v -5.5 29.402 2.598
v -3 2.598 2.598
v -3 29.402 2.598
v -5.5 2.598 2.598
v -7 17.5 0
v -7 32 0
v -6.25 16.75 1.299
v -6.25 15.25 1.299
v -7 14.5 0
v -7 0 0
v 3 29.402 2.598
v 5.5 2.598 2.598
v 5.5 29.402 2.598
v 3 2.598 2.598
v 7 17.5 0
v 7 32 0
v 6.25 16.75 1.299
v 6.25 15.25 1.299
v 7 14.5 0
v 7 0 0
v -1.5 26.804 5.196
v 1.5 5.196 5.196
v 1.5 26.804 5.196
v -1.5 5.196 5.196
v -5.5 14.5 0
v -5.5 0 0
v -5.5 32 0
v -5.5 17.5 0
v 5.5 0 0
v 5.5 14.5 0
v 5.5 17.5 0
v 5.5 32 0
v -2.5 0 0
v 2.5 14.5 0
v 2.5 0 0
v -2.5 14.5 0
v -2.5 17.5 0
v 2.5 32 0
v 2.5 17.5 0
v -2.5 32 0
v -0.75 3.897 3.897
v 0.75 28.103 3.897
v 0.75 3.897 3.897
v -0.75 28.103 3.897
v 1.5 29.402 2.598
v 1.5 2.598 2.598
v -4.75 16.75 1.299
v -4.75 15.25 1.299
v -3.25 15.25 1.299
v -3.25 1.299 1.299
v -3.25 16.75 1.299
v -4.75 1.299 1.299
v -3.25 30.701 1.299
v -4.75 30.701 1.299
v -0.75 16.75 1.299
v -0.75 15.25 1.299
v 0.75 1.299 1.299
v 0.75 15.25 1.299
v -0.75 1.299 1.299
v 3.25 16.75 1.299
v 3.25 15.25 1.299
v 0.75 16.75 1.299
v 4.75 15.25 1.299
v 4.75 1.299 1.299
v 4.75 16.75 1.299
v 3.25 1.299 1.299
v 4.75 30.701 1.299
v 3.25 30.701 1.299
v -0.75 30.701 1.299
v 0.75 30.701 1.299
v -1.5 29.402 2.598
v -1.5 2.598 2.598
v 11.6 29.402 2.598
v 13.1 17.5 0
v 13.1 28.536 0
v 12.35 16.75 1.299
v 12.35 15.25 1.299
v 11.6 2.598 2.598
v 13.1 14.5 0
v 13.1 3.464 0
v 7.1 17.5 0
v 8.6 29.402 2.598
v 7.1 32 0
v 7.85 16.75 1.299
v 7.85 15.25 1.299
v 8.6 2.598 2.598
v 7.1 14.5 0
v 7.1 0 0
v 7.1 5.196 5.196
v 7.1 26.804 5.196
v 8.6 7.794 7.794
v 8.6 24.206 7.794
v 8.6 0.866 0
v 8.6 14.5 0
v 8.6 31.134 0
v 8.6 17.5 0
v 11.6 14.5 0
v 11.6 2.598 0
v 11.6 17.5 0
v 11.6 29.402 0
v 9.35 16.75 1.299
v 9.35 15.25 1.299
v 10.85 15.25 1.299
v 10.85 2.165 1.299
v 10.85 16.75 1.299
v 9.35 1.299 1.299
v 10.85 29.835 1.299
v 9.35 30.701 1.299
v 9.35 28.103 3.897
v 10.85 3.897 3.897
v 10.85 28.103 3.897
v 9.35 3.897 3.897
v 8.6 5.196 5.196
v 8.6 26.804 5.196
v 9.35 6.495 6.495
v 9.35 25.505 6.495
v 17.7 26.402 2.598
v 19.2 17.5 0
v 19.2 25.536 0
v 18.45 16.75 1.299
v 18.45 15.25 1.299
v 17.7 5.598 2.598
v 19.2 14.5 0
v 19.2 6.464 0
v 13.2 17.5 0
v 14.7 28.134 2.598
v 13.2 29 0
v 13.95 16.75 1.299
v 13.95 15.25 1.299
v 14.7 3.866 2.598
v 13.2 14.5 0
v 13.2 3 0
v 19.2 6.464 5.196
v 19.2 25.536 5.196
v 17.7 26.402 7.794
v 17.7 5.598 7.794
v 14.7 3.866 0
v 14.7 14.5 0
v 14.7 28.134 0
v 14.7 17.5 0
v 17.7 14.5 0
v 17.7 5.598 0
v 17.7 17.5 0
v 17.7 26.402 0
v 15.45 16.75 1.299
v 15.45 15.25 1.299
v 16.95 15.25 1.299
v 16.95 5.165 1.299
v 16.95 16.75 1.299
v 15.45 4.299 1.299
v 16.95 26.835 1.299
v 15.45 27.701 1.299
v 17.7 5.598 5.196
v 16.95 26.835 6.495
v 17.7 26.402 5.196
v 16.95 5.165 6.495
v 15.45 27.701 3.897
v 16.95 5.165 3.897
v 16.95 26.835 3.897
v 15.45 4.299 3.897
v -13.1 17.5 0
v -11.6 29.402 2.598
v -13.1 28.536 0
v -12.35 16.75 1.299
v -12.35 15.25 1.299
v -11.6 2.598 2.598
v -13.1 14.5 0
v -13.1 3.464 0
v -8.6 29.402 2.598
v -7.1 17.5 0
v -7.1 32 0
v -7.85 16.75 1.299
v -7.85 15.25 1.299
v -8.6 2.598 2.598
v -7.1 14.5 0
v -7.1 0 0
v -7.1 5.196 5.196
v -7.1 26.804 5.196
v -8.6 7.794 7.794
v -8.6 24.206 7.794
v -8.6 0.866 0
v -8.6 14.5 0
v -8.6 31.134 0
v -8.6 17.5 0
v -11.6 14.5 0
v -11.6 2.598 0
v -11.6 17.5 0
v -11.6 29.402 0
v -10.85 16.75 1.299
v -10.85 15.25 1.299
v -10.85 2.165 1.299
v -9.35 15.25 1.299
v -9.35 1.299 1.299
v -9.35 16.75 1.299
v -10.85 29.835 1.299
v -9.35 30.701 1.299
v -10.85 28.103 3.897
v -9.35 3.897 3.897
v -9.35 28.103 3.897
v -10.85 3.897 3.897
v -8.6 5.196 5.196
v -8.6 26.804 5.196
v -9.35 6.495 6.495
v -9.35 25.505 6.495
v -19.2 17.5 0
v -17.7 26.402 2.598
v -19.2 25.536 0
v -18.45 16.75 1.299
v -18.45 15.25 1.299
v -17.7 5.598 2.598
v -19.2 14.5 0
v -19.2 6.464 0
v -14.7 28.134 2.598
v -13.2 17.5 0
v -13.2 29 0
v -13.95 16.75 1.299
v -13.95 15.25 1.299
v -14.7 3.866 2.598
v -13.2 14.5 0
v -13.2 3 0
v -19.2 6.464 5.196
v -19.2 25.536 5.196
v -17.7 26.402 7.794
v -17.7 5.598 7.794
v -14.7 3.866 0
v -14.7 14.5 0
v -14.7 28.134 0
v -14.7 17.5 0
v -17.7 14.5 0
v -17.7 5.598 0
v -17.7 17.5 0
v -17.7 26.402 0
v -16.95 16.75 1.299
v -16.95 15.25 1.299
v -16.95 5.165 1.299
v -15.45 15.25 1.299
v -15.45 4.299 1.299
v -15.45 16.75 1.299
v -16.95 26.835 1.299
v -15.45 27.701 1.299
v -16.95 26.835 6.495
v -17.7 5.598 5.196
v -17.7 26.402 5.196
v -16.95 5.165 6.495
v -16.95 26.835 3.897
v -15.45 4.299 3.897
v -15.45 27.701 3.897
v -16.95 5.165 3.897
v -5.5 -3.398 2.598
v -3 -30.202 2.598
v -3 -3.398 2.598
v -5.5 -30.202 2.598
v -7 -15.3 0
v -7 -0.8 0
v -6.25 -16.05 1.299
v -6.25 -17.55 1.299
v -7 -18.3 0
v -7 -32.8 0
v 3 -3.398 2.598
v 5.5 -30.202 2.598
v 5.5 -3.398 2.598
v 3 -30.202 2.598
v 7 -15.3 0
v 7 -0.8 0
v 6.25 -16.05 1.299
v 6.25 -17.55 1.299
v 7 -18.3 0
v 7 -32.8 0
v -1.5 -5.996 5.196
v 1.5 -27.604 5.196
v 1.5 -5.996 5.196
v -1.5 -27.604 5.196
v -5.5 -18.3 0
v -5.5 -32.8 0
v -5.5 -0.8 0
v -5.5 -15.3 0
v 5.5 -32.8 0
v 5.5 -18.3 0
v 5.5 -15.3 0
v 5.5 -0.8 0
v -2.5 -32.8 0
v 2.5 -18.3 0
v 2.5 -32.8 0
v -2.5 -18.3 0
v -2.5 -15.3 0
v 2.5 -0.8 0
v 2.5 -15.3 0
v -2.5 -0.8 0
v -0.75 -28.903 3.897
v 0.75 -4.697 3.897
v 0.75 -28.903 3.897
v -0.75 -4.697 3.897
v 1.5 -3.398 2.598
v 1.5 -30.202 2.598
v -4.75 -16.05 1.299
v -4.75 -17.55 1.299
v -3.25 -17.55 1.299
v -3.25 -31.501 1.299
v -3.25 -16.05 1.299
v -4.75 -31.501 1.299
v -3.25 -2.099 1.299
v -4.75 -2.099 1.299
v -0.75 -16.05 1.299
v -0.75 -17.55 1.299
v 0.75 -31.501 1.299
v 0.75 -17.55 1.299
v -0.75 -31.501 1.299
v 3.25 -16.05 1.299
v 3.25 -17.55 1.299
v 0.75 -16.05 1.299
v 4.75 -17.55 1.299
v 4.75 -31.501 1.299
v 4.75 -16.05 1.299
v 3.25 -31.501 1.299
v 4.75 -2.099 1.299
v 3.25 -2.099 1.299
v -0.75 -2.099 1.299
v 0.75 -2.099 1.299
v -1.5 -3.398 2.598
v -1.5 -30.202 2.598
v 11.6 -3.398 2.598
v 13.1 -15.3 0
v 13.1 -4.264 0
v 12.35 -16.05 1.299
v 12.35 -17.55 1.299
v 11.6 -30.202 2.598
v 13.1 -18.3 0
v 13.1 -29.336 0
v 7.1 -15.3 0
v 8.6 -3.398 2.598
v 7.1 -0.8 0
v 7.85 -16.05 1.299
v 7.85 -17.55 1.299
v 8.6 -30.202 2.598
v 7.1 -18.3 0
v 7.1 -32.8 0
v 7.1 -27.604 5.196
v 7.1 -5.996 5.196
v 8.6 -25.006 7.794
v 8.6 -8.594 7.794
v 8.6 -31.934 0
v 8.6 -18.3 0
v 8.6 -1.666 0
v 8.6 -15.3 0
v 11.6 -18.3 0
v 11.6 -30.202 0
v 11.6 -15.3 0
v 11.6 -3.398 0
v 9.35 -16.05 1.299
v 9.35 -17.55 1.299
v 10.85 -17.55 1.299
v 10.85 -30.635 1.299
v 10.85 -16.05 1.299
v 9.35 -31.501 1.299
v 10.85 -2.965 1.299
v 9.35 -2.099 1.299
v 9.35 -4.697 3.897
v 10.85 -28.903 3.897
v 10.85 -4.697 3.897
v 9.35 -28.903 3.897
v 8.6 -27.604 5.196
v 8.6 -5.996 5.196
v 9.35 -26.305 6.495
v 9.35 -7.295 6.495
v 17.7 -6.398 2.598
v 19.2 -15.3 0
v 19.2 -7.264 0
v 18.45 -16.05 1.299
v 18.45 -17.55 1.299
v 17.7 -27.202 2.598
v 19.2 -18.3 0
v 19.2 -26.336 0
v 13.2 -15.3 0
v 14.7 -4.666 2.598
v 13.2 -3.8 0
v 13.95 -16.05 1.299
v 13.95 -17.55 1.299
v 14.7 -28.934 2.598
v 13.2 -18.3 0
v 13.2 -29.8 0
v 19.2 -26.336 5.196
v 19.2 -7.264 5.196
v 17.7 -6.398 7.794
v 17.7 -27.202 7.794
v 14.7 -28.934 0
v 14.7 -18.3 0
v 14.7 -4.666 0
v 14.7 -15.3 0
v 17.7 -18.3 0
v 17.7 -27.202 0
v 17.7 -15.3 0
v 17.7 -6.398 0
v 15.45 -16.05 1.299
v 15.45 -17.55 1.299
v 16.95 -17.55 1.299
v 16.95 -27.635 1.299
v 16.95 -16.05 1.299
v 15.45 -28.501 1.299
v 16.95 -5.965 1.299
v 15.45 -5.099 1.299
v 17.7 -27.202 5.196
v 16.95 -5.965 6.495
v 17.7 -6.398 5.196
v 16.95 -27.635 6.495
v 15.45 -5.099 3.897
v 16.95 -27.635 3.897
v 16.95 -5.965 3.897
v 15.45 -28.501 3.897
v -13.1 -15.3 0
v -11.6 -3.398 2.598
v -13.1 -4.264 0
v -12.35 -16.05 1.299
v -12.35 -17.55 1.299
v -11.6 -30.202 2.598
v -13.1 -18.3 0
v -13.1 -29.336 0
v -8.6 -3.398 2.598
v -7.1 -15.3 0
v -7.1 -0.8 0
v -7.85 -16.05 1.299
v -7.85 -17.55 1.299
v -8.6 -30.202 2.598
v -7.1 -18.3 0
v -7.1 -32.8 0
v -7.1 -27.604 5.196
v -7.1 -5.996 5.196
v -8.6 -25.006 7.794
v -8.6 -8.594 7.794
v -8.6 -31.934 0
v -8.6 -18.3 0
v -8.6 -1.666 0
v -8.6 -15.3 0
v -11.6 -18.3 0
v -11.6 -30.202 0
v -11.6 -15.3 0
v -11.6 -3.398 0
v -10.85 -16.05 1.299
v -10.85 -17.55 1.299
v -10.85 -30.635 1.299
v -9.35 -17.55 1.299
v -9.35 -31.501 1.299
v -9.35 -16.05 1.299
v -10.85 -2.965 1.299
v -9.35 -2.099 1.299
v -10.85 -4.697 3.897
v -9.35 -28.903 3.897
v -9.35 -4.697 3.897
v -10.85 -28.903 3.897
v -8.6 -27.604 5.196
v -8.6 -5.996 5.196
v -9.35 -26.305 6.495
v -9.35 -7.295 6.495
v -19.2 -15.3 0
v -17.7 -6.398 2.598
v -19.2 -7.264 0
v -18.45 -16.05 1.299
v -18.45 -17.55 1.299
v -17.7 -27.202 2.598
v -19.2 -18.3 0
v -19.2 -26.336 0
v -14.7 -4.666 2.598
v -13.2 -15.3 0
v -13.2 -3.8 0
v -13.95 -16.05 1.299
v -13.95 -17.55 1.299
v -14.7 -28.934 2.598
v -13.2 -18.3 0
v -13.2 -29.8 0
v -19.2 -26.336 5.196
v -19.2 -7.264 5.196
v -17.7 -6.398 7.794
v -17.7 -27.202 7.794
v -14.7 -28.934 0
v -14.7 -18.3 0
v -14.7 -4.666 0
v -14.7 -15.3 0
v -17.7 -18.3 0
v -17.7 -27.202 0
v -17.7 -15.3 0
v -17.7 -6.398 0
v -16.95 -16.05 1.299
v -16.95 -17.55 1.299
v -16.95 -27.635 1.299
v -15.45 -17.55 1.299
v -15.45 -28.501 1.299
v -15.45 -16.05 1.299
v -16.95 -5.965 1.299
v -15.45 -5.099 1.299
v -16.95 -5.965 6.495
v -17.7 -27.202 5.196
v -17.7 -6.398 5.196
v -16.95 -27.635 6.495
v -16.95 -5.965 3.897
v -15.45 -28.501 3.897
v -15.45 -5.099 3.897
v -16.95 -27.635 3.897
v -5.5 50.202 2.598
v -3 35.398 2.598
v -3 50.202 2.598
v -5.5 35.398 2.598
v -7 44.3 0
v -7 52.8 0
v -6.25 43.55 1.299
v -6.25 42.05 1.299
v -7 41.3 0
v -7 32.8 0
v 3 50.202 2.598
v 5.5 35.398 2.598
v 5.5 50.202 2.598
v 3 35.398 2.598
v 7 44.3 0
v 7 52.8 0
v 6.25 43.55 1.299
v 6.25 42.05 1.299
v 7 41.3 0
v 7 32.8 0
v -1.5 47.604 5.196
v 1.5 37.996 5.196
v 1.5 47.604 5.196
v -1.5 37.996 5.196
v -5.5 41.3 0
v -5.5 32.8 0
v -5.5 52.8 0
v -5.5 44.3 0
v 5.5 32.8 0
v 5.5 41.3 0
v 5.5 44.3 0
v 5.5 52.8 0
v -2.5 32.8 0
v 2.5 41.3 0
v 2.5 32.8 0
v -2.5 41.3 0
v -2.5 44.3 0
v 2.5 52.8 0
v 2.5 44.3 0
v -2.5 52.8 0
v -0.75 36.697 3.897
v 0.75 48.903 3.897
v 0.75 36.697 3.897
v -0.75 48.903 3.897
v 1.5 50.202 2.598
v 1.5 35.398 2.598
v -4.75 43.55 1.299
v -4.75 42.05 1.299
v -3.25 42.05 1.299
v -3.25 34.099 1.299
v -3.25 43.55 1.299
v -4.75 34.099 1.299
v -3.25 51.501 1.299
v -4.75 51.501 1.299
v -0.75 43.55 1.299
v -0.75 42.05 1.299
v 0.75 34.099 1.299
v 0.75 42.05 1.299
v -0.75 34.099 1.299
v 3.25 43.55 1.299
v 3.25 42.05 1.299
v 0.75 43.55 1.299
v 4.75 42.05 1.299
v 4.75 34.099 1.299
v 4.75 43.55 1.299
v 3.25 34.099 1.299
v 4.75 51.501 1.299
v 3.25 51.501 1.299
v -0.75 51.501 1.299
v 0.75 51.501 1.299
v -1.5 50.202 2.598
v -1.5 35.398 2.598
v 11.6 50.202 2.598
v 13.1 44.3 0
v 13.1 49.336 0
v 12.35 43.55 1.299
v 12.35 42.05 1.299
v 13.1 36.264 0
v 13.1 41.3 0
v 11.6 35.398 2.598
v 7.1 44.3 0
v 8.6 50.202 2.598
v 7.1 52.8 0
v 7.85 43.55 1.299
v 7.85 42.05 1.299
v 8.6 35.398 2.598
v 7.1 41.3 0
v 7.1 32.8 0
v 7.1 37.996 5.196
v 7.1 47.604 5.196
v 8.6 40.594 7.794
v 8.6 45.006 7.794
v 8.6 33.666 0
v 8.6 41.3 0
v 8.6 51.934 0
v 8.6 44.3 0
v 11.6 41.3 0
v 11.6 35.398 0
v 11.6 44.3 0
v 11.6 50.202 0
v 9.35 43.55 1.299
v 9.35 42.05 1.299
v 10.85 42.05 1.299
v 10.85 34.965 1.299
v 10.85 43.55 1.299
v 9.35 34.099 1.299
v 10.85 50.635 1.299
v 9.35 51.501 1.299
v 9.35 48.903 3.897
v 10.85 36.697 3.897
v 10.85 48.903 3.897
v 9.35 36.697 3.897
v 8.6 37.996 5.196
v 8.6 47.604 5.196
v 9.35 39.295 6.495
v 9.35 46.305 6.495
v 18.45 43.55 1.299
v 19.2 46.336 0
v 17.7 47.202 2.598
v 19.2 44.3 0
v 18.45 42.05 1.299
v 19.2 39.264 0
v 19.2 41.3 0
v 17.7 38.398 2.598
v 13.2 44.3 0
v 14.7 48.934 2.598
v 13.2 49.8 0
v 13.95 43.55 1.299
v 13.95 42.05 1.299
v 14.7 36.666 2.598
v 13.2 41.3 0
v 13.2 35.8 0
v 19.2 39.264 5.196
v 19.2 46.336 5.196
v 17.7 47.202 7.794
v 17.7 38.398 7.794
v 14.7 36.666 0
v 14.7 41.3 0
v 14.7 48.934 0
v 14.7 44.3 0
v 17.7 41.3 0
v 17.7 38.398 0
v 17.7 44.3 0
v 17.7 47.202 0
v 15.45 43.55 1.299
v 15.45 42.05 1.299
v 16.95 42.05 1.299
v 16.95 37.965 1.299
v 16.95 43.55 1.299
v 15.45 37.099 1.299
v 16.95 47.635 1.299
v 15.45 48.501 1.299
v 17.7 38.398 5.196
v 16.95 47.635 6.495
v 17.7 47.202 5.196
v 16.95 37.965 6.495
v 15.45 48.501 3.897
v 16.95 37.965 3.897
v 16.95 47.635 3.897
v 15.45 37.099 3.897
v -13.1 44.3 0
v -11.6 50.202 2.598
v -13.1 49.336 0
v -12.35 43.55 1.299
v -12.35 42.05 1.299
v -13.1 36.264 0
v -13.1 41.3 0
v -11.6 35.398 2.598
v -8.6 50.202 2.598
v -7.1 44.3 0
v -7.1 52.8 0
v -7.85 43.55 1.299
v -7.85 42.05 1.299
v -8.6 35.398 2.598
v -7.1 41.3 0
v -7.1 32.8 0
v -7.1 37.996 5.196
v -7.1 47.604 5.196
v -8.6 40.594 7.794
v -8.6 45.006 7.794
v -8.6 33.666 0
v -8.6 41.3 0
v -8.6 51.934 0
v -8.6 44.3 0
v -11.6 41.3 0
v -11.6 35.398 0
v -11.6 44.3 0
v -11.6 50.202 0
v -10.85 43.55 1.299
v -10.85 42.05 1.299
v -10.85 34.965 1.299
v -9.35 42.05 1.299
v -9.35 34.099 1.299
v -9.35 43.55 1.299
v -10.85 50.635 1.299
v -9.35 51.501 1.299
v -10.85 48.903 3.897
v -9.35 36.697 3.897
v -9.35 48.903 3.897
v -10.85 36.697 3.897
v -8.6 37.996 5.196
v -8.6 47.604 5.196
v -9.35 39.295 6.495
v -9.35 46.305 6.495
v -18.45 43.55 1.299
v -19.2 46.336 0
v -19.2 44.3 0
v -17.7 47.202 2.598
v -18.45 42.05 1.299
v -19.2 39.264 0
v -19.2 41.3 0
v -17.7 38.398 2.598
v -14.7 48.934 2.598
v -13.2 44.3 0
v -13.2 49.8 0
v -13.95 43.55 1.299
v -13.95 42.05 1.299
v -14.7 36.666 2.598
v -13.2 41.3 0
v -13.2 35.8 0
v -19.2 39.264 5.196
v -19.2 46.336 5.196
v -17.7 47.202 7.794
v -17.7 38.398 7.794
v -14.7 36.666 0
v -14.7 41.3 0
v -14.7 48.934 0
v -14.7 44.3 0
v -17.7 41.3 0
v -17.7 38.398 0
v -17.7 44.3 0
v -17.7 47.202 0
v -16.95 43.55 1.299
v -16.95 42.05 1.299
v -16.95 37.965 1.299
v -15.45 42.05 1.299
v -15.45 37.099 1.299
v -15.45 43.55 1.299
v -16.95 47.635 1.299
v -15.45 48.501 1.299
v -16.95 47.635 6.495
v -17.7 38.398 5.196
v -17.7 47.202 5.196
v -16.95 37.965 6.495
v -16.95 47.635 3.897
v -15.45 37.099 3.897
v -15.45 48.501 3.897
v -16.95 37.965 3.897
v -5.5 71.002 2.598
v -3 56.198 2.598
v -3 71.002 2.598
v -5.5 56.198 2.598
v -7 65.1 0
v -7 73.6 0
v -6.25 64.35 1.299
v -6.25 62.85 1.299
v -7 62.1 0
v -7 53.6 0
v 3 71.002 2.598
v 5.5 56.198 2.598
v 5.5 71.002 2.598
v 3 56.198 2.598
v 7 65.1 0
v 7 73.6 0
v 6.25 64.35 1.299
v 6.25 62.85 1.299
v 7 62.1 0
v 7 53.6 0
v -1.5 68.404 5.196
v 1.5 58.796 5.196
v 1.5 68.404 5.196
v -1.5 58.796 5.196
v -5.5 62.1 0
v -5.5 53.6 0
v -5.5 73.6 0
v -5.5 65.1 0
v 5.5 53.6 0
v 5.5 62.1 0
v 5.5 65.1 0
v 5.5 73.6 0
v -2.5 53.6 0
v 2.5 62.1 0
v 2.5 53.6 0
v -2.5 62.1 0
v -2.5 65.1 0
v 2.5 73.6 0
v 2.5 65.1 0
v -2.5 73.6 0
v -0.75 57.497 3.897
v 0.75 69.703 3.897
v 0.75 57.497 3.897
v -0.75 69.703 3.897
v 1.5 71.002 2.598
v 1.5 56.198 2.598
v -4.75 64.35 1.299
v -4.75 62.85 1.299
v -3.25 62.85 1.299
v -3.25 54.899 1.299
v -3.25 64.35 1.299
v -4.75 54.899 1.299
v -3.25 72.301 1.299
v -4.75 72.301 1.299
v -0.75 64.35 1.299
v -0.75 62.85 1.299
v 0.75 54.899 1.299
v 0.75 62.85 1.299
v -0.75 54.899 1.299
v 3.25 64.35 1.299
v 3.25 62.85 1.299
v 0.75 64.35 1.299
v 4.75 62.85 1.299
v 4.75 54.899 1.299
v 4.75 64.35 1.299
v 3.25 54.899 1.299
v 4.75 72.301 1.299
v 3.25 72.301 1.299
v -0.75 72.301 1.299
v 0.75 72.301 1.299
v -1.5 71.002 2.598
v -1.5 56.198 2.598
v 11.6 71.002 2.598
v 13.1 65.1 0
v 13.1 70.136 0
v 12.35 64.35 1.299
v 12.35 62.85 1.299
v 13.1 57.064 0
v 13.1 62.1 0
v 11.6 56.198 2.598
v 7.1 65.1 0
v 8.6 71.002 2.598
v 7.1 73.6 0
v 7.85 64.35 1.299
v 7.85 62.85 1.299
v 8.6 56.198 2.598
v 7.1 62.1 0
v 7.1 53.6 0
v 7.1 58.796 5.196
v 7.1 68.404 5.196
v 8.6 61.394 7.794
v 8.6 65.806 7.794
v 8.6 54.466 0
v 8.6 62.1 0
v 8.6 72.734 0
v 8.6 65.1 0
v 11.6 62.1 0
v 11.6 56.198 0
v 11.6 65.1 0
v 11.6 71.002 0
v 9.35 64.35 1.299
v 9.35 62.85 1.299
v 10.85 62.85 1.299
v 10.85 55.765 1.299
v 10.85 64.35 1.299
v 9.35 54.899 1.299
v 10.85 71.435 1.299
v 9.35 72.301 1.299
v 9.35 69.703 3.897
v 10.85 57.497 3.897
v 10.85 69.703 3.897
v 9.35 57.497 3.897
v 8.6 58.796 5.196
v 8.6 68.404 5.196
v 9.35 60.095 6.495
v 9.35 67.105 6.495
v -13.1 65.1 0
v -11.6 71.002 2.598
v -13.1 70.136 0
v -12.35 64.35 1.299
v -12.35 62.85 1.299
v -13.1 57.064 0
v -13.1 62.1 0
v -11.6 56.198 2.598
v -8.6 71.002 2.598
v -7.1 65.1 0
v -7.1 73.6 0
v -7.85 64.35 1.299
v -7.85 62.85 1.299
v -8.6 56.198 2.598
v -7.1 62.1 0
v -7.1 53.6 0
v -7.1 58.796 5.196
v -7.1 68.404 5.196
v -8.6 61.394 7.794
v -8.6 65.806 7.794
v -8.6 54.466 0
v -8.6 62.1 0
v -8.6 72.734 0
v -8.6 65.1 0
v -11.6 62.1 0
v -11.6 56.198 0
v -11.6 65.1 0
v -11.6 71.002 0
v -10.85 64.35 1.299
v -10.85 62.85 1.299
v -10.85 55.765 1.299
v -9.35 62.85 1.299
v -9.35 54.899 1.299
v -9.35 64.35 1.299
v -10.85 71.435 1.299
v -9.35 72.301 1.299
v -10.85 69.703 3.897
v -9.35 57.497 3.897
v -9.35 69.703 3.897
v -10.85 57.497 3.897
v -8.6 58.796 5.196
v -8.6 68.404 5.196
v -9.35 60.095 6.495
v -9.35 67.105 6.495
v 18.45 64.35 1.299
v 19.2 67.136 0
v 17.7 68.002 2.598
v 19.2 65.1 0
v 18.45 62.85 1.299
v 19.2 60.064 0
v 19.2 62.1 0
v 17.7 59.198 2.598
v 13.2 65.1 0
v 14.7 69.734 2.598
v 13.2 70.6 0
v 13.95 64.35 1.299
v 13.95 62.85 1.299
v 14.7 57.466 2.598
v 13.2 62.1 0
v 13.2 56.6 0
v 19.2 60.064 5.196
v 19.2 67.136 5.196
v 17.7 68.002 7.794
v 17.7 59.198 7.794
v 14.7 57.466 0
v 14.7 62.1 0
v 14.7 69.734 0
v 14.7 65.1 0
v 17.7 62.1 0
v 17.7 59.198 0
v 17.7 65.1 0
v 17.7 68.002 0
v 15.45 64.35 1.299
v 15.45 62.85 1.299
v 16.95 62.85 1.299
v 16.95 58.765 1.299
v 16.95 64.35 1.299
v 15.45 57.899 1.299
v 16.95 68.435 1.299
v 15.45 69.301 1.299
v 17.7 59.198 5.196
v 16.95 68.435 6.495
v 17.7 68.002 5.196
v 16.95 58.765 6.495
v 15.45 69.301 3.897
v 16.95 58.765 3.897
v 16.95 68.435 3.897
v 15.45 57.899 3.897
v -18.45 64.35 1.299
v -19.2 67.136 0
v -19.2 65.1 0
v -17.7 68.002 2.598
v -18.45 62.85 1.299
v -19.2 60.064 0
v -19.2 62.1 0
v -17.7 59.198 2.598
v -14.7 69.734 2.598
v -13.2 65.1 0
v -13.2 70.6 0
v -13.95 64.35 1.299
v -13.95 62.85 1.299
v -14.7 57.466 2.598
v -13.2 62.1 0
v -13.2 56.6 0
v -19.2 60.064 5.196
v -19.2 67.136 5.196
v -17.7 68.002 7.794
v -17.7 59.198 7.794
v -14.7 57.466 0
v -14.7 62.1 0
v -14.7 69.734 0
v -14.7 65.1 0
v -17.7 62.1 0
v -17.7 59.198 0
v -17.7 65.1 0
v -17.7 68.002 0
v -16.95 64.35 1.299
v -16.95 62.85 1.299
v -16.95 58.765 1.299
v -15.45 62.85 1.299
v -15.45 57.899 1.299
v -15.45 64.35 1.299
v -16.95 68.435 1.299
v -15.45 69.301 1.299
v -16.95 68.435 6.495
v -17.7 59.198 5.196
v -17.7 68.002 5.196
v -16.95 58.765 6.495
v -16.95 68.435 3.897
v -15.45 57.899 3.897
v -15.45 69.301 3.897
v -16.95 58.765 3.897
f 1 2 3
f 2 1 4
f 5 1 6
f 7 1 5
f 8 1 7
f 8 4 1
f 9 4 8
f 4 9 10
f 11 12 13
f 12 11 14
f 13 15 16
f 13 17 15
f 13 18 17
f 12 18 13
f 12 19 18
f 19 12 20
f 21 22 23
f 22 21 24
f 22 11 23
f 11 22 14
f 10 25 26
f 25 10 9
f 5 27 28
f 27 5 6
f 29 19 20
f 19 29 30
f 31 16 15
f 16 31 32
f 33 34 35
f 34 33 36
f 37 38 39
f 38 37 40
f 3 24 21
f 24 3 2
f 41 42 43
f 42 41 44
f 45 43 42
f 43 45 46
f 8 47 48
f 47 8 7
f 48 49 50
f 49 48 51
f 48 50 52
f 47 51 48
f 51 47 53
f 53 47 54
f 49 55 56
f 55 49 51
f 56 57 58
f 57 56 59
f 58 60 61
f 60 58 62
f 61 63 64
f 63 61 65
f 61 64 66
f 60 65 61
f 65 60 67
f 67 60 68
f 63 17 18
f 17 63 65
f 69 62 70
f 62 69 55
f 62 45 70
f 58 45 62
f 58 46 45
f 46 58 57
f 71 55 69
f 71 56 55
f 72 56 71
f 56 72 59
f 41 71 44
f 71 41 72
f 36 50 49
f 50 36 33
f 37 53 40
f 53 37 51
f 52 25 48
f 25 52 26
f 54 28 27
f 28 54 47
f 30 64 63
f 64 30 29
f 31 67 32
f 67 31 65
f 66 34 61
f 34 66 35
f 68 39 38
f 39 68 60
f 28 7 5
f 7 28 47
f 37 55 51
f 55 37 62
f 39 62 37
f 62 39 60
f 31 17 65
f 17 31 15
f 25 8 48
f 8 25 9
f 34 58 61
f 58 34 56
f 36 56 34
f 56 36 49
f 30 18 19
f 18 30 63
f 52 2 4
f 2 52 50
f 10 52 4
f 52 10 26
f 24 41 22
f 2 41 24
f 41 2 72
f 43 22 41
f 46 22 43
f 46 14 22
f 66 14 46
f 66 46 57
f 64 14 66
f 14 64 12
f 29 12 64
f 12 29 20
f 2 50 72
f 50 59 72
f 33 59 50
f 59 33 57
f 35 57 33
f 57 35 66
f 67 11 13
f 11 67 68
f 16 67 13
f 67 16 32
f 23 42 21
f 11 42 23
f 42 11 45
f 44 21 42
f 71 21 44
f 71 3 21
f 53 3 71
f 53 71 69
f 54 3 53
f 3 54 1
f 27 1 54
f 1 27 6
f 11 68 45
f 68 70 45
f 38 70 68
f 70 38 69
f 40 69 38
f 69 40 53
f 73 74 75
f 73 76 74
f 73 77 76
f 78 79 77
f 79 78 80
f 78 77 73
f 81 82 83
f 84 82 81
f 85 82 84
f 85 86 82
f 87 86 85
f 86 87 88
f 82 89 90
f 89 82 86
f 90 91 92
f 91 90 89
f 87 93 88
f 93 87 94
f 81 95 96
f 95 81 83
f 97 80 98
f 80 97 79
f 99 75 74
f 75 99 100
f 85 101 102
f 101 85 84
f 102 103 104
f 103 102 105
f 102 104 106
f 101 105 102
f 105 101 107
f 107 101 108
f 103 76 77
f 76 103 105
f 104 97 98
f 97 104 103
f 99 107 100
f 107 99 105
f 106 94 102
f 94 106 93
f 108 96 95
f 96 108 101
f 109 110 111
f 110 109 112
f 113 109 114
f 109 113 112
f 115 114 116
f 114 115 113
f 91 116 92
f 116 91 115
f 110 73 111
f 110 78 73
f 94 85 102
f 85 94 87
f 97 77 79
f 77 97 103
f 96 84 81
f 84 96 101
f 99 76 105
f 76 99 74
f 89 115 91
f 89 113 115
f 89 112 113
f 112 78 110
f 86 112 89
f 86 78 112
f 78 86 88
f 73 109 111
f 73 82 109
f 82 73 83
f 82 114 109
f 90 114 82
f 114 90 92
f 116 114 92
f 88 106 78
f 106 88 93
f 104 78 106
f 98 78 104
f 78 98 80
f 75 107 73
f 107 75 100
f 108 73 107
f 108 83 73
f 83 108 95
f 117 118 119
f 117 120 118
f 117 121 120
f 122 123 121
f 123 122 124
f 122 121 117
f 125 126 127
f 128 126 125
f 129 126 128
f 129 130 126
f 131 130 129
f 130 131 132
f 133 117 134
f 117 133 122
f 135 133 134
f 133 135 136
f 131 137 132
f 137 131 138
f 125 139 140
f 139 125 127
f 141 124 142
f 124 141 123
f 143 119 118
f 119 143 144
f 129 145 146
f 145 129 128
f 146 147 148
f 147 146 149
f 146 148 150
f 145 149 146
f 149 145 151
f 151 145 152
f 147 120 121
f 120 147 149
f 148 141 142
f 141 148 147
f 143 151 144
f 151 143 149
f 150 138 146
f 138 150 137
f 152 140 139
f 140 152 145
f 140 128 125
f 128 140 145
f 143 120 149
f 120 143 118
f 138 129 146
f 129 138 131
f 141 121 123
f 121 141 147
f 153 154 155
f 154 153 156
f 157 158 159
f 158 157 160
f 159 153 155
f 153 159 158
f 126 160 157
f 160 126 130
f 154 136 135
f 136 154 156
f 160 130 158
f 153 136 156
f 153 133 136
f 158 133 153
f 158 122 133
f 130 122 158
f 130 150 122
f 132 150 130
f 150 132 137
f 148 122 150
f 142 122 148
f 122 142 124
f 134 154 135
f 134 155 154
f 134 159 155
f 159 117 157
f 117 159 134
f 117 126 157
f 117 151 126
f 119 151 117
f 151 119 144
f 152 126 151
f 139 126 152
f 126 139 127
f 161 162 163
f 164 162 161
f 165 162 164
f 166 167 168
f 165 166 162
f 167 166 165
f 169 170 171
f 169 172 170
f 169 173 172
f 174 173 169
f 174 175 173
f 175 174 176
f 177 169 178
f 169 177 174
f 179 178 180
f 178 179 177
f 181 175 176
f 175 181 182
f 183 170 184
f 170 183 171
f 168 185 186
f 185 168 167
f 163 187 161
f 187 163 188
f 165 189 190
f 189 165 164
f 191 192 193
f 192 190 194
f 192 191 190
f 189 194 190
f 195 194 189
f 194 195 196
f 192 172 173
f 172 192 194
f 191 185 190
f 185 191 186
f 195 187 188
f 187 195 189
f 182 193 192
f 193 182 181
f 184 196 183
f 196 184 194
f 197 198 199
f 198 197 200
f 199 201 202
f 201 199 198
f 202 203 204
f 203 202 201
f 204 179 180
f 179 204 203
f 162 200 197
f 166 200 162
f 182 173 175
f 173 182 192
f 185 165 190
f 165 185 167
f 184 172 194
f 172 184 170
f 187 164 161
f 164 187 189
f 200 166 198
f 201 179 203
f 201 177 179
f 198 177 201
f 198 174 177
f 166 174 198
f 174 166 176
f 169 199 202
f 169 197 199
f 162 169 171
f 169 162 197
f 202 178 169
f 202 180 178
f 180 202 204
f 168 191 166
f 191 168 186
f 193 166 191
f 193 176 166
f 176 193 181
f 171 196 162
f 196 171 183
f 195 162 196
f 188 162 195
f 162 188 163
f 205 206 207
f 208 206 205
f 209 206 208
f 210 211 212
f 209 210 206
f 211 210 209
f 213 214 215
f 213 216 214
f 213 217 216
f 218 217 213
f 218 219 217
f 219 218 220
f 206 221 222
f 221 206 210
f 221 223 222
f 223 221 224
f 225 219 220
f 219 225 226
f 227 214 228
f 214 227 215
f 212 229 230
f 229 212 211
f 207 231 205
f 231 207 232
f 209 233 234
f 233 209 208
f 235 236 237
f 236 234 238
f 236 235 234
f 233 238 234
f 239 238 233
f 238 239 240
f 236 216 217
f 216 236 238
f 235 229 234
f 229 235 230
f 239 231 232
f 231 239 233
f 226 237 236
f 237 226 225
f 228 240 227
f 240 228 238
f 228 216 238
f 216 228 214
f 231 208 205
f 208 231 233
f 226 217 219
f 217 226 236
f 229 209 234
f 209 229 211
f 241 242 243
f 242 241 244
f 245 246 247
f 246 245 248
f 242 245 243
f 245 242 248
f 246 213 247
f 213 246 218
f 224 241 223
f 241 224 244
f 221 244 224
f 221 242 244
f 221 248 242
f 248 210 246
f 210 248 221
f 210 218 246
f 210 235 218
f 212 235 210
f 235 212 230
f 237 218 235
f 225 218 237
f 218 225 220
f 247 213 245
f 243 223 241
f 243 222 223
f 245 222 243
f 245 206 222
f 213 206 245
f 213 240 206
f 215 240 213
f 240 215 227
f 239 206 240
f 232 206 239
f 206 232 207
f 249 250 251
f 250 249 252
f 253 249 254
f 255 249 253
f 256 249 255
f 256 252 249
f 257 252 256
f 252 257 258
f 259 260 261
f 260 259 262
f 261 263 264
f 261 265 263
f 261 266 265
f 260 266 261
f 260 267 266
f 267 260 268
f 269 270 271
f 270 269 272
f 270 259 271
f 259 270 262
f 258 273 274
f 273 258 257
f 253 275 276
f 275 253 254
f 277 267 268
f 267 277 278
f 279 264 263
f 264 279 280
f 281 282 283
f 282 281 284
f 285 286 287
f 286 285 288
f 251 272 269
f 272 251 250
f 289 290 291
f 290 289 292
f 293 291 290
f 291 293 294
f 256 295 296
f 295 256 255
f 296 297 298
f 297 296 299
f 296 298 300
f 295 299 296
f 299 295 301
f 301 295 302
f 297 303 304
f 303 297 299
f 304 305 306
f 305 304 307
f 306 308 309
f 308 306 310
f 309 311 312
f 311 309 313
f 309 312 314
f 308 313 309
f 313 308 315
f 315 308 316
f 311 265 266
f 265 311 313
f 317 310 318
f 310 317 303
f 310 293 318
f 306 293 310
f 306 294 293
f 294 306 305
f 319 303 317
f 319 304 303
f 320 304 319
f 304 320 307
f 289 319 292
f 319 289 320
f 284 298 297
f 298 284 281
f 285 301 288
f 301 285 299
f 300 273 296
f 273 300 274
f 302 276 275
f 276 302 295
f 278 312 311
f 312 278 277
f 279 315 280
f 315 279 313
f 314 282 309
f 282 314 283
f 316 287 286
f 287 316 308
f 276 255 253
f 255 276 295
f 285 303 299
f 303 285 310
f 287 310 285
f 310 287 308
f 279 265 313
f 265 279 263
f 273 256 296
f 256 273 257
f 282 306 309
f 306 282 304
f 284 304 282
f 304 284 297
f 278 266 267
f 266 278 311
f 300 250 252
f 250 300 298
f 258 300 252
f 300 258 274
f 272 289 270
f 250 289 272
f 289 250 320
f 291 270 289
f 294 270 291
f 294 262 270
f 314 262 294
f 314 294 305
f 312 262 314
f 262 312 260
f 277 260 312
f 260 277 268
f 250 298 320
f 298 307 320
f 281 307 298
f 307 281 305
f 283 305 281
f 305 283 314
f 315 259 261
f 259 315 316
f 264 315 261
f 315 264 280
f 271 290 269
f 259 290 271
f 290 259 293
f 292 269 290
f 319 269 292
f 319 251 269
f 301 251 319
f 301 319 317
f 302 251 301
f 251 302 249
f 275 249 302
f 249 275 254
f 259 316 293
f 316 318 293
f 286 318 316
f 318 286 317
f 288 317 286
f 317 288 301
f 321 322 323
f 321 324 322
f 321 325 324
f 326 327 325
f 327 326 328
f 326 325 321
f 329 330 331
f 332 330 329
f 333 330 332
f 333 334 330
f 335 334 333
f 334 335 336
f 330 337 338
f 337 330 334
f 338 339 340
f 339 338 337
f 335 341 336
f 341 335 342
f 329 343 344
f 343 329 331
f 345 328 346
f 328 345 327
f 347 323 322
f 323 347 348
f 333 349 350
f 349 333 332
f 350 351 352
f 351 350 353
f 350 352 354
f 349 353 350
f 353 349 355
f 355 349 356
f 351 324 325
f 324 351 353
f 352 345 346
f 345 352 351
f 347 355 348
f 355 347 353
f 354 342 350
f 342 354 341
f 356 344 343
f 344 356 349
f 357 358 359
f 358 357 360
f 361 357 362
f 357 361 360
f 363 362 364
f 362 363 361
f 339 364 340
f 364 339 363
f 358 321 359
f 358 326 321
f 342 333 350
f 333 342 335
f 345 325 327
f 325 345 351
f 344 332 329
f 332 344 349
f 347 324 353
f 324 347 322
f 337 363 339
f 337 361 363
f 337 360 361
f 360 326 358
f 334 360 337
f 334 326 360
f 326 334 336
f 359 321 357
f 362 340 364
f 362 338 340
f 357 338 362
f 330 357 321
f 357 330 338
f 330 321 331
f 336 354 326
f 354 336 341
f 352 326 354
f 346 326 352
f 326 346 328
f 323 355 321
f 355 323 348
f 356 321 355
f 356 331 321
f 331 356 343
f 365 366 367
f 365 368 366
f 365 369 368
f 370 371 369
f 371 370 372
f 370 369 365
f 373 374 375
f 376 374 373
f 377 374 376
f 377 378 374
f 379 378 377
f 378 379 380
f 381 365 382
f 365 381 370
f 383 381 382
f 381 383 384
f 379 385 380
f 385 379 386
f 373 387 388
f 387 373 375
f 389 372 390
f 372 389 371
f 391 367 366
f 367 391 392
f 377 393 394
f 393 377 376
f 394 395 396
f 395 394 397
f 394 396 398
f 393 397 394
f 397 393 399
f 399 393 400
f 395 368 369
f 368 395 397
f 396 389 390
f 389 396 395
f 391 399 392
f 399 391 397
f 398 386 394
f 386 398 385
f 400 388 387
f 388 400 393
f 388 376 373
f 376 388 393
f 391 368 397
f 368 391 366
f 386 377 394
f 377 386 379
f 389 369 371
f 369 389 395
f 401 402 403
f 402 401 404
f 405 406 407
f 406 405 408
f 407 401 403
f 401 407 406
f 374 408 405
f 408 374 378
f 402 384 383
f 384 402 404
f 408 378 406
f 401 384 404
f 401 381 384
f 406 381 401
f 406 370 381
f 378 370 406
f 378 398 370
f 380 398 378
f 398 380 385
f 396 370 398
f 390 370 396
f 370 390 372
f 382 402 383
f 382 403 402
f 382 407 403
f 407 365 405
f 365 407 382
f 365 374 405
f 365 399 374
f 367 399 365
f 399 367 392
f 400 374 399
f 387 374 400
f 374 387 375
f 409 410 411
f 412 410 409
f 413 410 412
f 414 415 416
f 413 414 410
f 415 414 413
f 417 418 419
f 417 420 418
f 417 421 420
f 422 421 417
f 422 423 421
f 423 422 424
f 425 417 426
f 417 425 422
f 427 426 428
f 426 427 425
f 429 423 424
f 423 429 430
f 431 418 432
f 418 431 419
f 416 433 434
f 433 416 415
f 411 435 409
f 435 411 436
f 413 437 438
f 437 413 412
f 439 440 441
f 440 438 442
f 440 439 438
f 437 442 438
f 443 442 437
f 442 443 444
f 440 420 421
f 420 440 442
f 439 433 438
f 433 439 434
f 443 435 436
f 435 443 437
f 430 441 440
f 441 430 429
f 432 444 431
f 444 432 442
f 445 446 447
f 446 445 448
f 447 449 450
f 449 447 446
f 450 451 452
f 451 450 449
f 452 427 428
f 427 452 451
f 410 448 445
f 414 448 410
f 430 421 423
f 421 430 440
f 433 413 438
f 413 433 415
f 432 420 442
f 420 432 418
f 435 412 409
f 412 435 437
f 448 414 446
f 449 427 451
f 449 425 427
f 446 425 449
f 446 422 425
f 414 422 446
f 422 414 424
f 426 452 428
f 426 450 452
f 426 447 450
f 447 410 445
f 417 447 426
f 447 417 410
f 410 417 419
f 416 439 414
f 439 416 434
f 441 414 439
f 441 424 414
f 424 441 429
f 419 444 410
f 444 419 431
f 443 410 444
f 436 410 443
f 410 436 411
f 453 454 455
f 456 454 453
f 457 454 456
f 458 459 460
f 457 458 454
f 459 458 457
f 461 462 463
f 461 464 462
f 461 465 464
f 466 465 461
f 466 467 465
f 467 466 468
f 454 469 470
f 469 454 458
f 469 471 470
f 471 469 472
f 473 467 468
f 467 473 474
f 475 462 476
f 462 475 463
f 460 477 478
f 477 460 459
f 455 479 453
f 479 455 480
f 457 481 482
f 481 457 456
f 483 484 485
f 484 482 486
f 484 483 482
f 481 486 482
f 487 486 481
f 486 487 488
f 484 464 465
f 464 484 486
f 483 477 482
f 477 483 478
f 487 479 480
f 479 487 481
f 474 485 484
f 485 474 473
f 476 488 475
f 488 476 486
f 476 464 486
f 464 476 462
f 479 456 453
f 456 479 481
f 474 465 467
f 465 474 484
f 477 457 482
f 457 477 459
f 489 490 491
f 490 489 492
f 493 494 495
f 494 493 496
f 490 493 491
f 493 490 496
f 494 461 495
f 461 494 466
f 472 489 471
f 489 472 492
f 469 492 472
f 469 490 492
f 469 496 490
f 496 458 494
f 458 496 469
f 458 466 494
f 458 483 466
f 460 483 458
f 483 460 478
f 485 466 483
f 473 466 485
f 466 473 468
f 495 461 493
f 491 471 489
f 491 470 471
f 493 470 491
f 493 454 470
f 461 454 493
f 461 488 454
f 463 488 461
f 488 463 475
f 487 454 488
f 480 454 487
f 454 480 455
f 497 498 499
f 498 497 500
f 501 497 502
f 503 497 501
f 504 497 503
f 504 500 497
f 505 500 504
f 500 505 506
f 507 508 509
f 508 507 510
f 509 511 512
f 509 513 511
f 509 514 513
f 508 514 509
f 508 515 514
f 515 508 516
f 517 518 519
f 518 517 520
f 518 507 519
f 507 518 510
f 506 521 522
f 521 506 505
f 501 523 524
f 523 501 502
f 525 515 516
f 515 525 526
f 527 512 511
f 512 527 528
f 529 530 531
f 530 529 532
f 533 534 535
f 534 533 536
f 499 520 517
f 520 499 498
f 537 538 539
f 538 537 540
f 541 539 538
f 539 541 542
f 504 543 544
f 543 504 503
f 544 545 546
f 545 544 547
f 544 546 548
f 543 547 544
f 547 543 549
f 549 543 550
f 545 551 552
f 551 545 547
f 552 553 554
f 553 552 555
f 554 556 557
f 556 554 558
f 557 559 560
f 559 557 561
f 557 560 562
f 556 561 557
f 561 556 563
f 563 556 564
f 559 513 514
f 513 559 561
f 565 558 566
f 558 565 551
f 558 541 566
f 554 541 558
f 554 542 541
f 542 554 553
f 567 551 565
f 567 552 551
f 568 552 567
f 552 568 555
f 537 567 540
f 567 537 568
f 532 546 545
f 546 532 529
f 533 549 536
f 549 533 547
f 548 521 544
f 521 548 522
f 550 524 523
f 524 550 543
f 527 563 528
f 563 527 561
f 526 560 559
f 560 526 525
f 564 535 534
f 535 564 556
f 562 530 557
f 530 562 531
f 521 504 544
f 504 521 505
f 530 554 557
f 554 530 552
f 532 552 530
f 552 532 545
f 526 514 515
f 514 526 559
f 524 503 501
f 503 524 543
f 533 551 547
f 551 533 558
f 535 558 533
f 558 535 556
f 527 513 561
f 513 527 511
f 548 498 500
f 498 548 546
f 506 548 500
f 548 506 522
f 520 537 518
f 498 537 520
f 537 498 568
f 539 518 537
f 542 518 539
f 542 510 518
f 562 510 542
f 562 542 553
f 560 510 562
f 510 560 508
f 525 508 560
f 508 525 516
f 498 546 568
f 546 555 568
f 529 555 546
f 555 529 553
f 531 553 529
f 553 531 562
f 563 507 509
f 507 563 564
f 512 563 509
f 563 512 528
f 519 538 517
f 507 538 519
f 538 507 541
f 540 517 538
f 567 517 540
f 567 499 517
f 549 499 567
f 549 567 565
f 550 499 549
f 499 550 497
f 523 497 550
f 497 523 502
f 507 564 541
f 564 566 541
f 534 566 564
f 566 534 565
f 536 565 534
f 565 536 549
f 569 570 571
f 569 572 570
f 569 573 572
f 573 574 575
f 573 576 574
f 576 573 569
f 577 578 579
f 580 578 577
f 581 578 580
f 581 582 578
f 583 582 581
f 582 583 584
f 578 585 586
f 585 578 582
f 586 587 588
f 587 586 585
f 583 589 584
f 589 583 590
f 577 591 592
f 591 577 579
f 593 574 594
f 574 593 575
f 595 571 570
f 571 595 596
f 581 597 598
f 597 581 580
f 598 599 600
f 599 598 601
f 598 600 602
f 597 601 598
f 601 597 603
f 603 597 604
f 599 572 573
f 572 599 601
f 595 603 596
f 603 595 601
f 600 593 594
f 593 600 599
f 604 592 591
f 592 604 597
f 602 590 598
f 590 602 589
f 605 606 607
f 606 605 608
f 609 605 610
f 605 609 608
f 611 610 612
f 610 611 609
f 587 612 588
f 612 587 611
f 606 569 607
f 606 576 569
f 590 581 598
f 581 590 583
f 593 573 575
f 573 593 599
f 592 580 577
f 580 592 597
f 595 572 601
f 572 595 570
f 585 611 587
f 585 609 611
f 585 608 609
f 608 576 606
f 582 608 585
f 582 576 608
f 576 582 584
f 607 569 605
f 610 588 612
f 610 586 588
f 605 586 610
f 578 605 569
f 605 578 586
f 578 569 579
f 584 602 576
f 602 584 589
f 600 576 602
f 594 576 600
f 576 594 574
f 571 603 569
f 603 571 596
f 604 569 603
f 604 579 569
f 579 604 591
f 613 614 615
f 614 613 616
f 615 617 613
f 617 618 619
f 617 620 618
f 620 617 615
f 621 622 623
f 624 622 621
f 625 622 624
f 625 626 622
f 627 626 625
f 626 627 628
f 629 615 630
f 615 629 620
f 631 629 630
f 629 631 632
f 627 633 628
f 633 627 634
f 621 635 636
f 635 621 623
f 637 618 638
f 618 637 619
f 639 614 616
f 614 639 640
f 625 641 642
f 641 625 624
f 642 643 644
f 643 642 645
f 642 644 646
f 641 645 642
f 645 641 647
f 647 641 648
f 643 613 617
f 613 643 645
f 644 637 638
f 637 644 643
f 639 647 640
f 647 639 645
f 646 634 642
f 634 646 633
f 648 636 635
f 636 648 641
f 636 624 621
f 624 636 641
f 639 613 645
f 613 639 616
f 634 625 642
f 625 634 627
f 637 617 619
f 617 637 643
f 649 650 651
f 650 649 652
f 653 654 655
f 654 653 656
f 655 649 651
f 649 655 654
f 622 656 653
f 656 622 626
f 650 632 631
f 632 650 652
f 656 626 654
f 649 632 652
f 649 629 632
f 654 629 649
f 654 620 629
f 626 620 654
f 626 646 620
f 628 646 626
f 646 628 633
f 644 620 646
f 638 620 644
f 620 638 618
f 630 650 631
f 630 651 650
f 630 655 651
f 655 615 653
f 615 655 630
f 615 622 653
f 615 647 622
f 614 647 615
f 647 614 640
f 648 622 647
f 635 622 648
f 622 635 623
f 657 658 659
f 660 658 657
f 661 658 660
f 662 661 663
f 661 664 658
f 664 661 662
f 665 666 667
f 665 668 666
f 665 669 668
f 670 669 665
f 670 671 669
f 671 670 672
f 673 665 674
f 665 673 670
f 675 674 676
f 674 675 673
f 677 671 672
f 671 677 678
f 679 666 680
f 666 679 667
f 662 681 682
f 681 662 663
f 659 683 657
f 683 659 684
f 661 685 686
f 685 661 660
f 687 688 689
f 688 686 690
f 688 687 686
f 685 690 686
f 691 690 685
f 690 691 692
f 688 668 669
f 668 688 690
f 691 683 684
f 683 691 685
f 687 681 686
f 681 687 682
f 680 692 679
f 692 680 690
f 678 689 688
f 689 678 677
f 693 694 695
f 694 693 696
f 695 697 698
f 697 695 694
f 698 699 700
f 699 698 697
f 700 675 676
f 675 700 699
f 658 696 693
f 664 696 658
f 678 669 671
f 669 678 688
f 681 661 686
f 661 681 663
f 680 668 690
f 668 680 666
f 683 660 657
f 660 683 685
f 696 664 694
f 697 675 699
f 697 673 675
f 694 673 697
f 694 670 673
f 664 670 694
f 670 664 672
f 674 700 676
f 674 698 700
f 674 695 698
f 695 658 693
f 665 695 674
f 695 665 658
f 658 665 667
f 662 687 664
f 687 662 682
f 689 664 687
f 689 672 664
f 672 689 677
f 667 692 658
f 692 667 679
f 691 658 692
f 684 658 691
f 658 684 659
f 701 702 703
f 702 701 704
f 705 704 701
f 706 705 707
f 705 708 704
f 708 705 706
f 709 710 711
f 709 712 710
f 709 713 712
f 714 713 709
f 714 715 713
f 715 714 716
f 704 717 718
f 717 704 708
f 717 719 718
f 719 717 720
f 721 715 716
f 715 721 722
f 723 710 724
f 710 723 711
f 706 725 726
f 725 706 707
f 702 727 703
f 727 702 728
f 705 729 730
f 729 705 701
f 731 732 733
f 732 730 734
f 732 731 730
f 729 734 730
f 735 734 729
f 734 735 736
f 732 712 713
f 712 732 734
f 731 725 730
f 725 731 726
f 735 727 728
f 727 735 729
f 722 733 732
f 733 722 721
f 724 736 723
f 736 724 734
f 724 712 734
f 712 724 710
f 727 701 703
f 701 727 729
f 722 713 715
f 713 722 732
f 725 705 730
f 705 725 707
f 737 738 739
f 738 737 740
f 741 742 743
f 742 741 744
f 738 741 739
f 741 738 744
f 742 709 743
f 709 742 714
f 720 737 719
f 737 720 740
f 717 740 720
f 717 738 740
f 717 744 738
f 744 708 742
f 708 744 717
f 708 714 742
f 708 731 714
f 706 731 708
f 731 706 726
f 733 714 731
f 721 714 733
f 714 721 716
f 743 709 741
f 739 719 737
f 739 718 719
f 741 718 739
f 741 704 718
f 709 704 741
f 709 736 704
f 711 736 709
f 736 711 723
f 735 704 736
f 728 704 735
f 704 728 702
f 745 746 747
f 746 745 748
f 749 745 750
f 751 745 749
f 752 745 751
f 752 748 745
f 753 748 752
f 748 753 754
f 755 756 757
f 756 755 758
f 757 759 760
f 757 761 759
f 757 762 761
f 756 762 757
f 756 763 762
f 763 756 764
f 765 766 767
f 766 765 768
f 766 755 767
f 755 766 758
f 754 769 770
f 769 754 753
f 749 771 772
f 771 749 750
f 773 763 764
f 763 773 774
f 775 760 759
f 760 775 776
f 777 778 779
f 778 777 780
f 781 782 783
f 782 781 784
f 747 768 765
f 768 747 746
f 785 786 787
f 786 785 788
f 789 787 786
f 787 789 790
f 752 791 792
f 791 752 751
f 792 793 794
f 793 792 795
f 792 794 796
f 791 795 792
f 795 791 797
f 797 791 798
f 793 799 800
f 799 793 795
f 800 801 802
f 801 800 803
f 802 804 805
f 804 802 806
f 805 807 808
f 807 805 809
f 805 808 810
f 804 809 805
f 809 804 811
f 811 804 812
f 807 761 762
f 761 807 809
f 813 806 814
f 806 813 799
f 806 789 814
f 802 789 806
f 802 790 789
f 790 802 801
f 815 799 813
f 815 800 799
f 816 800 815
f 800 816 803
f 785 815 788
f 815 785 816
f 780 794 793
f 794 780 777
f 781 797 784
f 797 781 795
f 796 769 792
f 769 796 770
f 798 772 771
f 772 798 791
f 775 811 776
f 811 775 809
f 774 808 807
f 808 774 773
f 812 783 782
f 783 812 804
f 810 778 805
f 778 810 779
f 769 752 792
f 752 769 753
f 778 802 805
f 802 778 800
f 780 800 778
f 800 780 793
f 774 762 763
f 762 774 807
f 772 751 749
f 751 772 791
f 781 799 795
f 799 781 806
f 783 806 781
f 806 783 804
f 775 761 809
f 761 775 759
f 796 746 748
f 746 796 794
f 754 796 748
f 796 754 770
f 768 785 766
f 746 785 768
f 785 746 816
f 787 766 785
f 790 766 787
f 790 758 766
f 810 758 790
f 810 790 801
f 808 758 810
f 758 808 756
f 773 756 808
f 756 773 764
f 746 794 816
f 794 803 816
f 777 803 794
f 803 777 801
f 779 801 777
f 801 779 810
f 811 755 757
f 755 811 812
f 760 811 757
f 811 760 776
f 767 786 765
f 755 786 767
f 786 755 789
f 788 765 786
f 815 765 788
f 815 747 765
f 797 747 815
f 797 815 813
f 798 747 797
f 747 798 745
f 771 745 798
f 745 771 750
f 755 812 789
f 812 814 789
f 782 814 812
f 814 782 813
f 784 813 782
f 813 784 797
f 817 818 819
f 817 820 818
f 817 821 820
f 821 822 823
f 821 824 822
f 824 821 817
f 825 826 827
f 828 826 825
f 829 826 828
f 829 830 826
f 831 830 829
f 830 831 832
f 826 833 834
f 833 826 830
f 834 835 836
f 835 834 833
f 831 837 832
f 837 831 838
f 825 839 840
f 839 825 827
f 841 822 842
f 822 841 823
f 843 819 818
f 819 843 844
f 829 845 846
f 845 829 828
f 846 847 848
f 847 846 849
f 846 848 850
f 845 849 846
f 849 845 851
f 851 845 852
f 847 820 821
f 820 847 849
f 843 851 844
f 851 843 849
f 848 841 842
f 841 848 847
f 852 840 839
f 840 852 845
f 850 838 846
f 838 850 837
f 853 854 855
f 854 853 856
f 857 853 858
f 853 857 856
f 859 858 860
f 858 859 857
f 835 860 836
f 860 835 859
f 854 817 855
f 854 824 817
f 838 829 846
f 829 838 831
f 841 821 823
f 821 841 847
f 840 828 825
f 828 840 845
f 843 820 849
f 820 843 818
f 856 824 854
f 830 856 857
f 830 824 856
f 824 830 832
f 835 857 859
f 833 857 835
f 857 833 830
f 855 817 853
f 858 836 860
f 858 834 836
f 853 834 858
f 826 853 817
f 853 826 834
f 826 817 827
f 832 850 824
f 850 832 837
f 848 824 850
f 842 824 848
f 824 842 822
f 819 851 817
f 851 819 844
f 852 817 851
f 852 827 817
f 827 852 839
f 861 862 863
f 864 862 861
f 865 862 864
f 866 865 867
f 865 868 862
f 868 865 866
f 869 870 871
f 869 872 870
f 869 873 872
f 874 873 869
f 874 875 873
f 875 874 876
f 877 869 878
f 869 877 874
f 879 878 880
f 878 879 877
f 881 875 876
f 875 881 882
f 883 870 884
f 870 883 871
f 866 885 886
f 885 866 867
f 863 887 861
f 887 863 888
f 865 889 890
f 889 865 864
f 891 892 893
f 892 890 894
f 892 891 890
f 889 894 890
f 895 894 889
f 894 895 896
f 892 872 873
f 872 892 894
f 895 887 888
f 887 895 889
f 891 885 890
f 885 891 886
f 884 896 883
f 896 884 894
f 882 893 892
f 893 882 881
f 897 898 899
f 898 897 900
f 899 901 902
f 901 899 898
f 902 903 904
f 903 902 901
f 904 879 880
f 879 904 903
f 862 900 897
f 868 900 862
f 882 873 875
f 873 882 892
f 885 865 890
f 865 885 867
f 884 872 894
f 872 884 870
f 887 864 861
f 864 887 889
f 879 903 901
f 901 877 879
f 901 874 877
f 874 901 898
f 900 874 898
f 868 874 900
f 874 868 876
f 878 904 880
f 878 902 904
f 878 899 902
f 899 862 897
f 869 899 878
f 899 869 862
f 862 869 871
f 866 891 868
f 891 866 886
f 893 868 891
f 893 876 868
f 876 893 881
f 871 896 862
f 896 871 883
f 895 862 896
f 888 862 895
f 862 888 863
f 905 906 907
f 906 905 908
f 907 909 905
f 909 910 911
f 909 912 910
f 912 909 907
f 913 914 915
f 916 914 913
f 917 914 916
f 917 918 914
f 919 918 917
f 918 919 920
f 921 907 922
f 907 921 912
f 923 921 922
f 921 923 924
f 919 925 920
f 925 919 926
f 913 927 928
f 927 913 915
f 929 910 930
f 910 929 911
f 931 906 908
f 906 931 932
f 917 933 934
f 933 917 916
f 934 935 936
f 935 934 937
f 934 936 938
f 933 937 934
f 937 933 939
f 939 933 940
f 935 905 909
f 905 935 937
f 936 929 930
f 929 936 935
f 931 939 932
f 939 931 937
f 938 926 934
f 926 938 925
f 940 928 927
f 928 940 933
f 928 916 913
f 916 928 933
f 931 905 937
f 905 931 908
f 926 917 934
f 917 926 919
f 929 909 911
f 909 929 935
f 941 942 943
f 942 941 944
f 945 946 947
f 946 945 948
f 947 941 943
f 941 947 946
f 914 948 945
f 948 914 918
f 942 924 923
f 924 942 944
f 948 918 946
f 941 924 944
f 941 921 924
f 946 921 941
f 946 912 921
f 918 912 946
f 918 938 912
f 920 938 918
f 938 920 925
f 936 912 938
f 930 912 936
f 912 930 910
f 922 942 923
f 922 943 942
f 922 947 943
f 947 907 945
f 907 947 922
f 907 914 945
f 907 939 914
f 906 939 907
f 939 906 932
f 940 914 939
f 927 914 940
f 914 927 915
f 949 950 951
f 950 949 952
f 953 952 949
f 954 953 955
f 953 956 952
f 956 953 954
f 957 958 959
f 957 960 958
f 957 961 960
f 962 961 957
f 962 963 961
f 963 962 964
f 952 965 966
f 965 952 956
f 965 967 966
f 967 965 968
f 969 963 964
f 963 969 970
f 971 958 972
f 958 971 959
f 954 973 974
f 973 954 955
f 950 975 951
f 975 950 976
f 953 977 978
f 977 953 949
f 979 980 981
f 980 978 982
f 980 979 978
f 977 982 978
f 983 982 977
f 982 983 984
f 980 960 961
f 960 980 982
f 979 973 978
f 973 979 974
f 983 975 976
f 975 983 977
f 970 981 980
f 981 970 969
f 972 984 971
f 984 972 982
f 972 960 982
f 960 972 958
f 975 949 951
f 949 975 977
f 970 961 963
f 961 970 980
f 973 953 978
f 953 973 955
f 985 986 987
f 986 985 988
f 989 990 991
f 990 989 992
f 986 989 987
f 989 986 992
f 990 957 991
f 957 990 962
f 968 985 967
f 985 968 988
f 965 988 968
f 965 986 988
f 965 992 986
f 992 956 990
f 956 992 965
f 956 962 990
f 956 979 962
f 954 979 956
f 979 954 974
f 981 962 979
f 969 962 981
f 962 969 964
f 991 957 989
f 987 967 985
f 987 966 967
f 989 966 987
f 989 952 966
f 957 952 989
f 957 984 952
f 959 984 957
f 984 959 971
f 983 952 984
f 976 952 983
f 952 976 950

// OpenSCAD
// Finger variant constructed with triangle cross-sections.
//render_part=0; // tri_equ, equilateral triangle
 render_part=1; // joint_core()
render_part=2; // joint_side()
render_part=3; // joint_end()
render_part=4; // joint1()
//render_part=5; // joint1() animated
render_part=6; // finger()

module tri_equ(l=3.0) {
  scale([l,l])
    polygon(points=[[-0.5,0],[0.5,0],[0,sqrt(3)/2]], paths=[[0,1,2]]);
}

if(render_part==0) {
  echo("Rendering tri_equ()...");
  tri_equ();
}

module joint_core(l=8.0,d=3.0,s=0.1,a=45) {
  difference() {
    union() {
      translate([-d/3,0,0]) rotate([-90,0,0]) cylinder($fn=6,r=d/4,h=l,center=false);
      translate([d/3,0,0]) rotate([-90,0,0]) cylinder($fn=6,r=d/4,h=l,center=false);
      //translate([0,0,(sqrt(3)/3)*d/4]) rotate([-90,0,0]) cylinder($fn=6,r=d/3,h=l,center=false);
      translate([0,0,(sqrt(3)/2)*d/4]) rotate([-90,0,0]) cylinder($fn=6,r=d/4,h=l,center=false);
    }
    mirror([0,0,1]) translate([-d-s,-s,0]) cube(size=[2*d+2*s,l+2*s,2*d],center=false);
//    translate([0,-s,(sqrt(3)/2)*d/2]) rotate([-90,0,0]) cylinder($fn=6,r=d/8,h=l+2*s,center=false);
    translate([0,-s,(sqrt(3)/2)*d/4]) rotate([-90,0,0]) cylinder($fn=6,r=d/8,h=l+2*s,center=false);
    translate([-d/3,-s,0]) rotate([-90,0,0]) cylinder($fn=6,r=d/8,h=l+2*s,center=false);
    translate([d/3,-s,0]) rotate([-90,0,0]) cylinder($fn=6,r=d/8,h=l+2*s,center=false);
    // translate([0,-s,(sqrt(3)/3)*d/4]) rotate([-90,0,0]) cylinder($fn=6,r=d/8,h=l+2*s,center=false);
    //translate([0,-s,(sqrt(3)/3)*d/4]) rotate([-90,90,0]) cylinder($fn=3,r=(sqrt(3)/3)*d/4,h=l+2*s,center=false);
    translate([0,l/2,0]) rotate([-90,0,90]) cylinder($fn=6,r=d/8,h=l+2*s,center=true);
    // End slice angle
    translate([-d,0,0]) rotate([a,0,0]) cube(size=[2*d,2*d,2*d],center=false);
    translate([d,l,0]) rotate([a,0,180]) cube(size=[2*d,2*d,2*d],center=false);
  }
}

if(render_part==1) {
  echo("Rendering joint_core()...");
  joint_core(l=8*(8+5+3)/16,d=3.0);
}


module joint_side(l=8.0,d=0.3,s=0.1,a=45) {
  translate([d/3,0,0]) difference() {
    union() {
      // rotate([90,0,180]) linear_extrude(height=l) tri_equ(l=d/2);
      rotate([-90,0,0]) cylinder($fn=6,r=d/4,h=l,center=false);
      translate([0,0,(sqrt(3)/2)*d/2]) rotate([-90,0,0]) cylinder($fn=6,r=d/4,h=l,center=false);
      // Debug:
      //translate([-d/4,0,0]) cylinder(r=s,h=d,center=false);
    }
    mirror([0,0,1]) translate([-d/4-s,-s,0]) cube(size=[d/2+2*s,l+2*s,d/2],center=false);
    translate([0,-s,0]) rotate([-90,0,0]) cylinder($fn=6,r=d/8,h=l+2*s,center=false);
    translate([0,-s,(sqrt(3)/2)*d/2]) rotate([-90,0,0]) cylinder($fn=6,r=d/8,h=l+2*s,center=false); 
    translate([0,-s,(sqrt(3)/2)*d/2]) rotate([0,60,0]) translate([-d/2,0,0]) cube(size=[d,l+2*s,d],center=false);
    translate([0,l/2,0]) rotate([-90,0,90]) cylinder($fn=6,r=d/8,h=l+2*s,center=true);
    translate([-d,0,0]) rotate([a,0,0]) cube(size=[2*d,2*d,2*d],center=false);
    translate([d,l,0]) rotate([a,0,180]) cube(size=[2*d,2*d,2*d],center=false);
    translate([-d/4,0,-s]) rotate([0,0,-90+30]) cube(size=[2*d,2*d,2*d],center=false);
    translate([-d/4,l,-s]) rotate([0,0,-30]) cube(size=[2*d,2*d,2*d],center=false);

  }
}

if(render_part==2) {
  echo("Rendering joint_side()...");
  joint_side(l=8*(8+5+3)/16,d=3.0);
}

module joint_end(l=8.0,d=0.3,s=0.1,a=45) {
  translate([d/3,0,0]) difference() {
    union() {
      // rotate([90,0,180]) linear_extrude(height=l) tri_equ(l=d/2);
      rotate([-90,0,0]) cylinder($fn=6,r=d/4,h=l,center=false);
      //translate([d/3,0,(sqrt(3)/2)*d/4]) rotate([-90,0,0]) cylinder($fn=6,r=d/4,h=l,center=false);
      translate([0,0,(sqrt(3)/2)*d/2]) rotate([-90,0,0]) cylinder($fn=6,r=d/4,h=l,center=false);
    }
    mirror([0,0,1]) translate([-d/4-s,-s,0]) cube(size=[d/2+2*s,l+2*s,d/2],center=false);
    translate([0,-s,0]) rotate([-90,0,0])
      cylinder($fn=6,r=d/8,h=l+2*s,center=false);
    //translate([d/3,-s,(sqrt(3)/2)*d/4]) rotate([-90,0,0]) cylinder($fn=6,r=d/8,h=l+2*s,center=false);
    translate([0,l/2,0]) rotate([-90,0,90])
      cylinder($fn=6,r=d/8,h=l+2*s,center=true);
    translate([0,-s,(sqrt(3)/2)*d/2]) rotate([-90,0,0]) cylinder($fn=6,r=d/8,h=l+2*s,center=false); 
    translate([0,-s,(sqrt(3)/2)*d/2]) rotate([0,-60,0]) translate([-d/2,0,0]) cube(size=[d,l+2*s,d],center=false);
    //translate([-d,d/4,0]) rotate([a,0,0]) cube(size=[2*d,2*d,2*d],center=false);
    // translate([-d,d/2,0]) rotate([180-a,0,0]) cube(size=[2*d,2*d,2*d],center=false);
    //translate([d,l,0]) rotate([a,0,180]) cube(size=[2*d,2*d,2*d],center=false);
    translate([-d/4,0,-s]) rotate([0,0,-90+30]) cube(size=[2*d,2*d,2*d],center=false);
    translate([-d/4,l,-s]) rotate([0,0,-30]) cube(size=[2*d,2*d,2*d],center=false);
  }
}

if(render_part==3) {
  echo("Rendering joint_end()...");
  joint_end(l=8*(8+5+3)/16,d=3.0);
}

module joint1(l=8.0,d=3.0,s=0.1,close_angle=60) {
  joint_core(l=l,d=d,s=s);
  translate([d/2+s,0,0]) rotate([0,-close_angle,0]) joint_side(l=l,d=d,s=s);
  translate([d/2+s,d/4,0]) rotate([0,-close_angle,0])
    translate([d/2+s,0,0]) rotate([0,-close_angle,0]) joint_end(l=l-d/2,d=d,s=s);
  translate([-d/2-s,0,0]) mirror([1,0,0]) rotate([0,-close_angle,0]) joint_side(l=l,d=d,s=s);
//  translate([-d/2-s-d/2-s,0,0]) mirror([1,0,0]) rotate([0,-close_angle,0]) joint_end(l=l,d=d,s=s);
  mirror([1,0,0]) translate([d/2+s,d/4,0]) rotate([0,-close_angle,0])
    translate([d/2+s,0,0]) rotate([0,-close_angle,0]) joint_end(l=l-d/2,d=d,s=s);
}

if(render_part==4) {
  echo("Rendering joint1()...");
  joint1(l=8*(8+5+3)/16,d=3.0,close_angle=0);
}

if(render_part==5) {
  echo("Rendering joint1()...");
  joint1(l=8*(8+5+3)/16,d=3.0,close_angle=60*$t);
}

module finger(l=8+5+3,d=3.0,s=0.2,bolt_d=1.6) {
  translate([0,-(8+s)*l/16,0])
    //wrist_joint(l=8*l/16,d=d,bolt_d=bolt_d);
    joint1(l=8*l/16,d=d,close_angle=0);
  joint1(l=8*l/16,d=d,close_angle=0);
  translate([0,(8+s)*l/16,0]) {
    // joint2(l=5*l/16,d=d);
    joint1(l=5*l/16,d=d,close_angle=0);
    translate([0,(5+s)*l/16,0])
      // joint3(l=3*l/16,d=d,bolt_d=bolt_d);
      joint1(l=5*l/16,d=d,close_angle=0);
  }
}

if(render_part==6) {
  echo("Rendering joint1()...");
  finger(l=64,d=12.0,bolt_d=3.0);
}
